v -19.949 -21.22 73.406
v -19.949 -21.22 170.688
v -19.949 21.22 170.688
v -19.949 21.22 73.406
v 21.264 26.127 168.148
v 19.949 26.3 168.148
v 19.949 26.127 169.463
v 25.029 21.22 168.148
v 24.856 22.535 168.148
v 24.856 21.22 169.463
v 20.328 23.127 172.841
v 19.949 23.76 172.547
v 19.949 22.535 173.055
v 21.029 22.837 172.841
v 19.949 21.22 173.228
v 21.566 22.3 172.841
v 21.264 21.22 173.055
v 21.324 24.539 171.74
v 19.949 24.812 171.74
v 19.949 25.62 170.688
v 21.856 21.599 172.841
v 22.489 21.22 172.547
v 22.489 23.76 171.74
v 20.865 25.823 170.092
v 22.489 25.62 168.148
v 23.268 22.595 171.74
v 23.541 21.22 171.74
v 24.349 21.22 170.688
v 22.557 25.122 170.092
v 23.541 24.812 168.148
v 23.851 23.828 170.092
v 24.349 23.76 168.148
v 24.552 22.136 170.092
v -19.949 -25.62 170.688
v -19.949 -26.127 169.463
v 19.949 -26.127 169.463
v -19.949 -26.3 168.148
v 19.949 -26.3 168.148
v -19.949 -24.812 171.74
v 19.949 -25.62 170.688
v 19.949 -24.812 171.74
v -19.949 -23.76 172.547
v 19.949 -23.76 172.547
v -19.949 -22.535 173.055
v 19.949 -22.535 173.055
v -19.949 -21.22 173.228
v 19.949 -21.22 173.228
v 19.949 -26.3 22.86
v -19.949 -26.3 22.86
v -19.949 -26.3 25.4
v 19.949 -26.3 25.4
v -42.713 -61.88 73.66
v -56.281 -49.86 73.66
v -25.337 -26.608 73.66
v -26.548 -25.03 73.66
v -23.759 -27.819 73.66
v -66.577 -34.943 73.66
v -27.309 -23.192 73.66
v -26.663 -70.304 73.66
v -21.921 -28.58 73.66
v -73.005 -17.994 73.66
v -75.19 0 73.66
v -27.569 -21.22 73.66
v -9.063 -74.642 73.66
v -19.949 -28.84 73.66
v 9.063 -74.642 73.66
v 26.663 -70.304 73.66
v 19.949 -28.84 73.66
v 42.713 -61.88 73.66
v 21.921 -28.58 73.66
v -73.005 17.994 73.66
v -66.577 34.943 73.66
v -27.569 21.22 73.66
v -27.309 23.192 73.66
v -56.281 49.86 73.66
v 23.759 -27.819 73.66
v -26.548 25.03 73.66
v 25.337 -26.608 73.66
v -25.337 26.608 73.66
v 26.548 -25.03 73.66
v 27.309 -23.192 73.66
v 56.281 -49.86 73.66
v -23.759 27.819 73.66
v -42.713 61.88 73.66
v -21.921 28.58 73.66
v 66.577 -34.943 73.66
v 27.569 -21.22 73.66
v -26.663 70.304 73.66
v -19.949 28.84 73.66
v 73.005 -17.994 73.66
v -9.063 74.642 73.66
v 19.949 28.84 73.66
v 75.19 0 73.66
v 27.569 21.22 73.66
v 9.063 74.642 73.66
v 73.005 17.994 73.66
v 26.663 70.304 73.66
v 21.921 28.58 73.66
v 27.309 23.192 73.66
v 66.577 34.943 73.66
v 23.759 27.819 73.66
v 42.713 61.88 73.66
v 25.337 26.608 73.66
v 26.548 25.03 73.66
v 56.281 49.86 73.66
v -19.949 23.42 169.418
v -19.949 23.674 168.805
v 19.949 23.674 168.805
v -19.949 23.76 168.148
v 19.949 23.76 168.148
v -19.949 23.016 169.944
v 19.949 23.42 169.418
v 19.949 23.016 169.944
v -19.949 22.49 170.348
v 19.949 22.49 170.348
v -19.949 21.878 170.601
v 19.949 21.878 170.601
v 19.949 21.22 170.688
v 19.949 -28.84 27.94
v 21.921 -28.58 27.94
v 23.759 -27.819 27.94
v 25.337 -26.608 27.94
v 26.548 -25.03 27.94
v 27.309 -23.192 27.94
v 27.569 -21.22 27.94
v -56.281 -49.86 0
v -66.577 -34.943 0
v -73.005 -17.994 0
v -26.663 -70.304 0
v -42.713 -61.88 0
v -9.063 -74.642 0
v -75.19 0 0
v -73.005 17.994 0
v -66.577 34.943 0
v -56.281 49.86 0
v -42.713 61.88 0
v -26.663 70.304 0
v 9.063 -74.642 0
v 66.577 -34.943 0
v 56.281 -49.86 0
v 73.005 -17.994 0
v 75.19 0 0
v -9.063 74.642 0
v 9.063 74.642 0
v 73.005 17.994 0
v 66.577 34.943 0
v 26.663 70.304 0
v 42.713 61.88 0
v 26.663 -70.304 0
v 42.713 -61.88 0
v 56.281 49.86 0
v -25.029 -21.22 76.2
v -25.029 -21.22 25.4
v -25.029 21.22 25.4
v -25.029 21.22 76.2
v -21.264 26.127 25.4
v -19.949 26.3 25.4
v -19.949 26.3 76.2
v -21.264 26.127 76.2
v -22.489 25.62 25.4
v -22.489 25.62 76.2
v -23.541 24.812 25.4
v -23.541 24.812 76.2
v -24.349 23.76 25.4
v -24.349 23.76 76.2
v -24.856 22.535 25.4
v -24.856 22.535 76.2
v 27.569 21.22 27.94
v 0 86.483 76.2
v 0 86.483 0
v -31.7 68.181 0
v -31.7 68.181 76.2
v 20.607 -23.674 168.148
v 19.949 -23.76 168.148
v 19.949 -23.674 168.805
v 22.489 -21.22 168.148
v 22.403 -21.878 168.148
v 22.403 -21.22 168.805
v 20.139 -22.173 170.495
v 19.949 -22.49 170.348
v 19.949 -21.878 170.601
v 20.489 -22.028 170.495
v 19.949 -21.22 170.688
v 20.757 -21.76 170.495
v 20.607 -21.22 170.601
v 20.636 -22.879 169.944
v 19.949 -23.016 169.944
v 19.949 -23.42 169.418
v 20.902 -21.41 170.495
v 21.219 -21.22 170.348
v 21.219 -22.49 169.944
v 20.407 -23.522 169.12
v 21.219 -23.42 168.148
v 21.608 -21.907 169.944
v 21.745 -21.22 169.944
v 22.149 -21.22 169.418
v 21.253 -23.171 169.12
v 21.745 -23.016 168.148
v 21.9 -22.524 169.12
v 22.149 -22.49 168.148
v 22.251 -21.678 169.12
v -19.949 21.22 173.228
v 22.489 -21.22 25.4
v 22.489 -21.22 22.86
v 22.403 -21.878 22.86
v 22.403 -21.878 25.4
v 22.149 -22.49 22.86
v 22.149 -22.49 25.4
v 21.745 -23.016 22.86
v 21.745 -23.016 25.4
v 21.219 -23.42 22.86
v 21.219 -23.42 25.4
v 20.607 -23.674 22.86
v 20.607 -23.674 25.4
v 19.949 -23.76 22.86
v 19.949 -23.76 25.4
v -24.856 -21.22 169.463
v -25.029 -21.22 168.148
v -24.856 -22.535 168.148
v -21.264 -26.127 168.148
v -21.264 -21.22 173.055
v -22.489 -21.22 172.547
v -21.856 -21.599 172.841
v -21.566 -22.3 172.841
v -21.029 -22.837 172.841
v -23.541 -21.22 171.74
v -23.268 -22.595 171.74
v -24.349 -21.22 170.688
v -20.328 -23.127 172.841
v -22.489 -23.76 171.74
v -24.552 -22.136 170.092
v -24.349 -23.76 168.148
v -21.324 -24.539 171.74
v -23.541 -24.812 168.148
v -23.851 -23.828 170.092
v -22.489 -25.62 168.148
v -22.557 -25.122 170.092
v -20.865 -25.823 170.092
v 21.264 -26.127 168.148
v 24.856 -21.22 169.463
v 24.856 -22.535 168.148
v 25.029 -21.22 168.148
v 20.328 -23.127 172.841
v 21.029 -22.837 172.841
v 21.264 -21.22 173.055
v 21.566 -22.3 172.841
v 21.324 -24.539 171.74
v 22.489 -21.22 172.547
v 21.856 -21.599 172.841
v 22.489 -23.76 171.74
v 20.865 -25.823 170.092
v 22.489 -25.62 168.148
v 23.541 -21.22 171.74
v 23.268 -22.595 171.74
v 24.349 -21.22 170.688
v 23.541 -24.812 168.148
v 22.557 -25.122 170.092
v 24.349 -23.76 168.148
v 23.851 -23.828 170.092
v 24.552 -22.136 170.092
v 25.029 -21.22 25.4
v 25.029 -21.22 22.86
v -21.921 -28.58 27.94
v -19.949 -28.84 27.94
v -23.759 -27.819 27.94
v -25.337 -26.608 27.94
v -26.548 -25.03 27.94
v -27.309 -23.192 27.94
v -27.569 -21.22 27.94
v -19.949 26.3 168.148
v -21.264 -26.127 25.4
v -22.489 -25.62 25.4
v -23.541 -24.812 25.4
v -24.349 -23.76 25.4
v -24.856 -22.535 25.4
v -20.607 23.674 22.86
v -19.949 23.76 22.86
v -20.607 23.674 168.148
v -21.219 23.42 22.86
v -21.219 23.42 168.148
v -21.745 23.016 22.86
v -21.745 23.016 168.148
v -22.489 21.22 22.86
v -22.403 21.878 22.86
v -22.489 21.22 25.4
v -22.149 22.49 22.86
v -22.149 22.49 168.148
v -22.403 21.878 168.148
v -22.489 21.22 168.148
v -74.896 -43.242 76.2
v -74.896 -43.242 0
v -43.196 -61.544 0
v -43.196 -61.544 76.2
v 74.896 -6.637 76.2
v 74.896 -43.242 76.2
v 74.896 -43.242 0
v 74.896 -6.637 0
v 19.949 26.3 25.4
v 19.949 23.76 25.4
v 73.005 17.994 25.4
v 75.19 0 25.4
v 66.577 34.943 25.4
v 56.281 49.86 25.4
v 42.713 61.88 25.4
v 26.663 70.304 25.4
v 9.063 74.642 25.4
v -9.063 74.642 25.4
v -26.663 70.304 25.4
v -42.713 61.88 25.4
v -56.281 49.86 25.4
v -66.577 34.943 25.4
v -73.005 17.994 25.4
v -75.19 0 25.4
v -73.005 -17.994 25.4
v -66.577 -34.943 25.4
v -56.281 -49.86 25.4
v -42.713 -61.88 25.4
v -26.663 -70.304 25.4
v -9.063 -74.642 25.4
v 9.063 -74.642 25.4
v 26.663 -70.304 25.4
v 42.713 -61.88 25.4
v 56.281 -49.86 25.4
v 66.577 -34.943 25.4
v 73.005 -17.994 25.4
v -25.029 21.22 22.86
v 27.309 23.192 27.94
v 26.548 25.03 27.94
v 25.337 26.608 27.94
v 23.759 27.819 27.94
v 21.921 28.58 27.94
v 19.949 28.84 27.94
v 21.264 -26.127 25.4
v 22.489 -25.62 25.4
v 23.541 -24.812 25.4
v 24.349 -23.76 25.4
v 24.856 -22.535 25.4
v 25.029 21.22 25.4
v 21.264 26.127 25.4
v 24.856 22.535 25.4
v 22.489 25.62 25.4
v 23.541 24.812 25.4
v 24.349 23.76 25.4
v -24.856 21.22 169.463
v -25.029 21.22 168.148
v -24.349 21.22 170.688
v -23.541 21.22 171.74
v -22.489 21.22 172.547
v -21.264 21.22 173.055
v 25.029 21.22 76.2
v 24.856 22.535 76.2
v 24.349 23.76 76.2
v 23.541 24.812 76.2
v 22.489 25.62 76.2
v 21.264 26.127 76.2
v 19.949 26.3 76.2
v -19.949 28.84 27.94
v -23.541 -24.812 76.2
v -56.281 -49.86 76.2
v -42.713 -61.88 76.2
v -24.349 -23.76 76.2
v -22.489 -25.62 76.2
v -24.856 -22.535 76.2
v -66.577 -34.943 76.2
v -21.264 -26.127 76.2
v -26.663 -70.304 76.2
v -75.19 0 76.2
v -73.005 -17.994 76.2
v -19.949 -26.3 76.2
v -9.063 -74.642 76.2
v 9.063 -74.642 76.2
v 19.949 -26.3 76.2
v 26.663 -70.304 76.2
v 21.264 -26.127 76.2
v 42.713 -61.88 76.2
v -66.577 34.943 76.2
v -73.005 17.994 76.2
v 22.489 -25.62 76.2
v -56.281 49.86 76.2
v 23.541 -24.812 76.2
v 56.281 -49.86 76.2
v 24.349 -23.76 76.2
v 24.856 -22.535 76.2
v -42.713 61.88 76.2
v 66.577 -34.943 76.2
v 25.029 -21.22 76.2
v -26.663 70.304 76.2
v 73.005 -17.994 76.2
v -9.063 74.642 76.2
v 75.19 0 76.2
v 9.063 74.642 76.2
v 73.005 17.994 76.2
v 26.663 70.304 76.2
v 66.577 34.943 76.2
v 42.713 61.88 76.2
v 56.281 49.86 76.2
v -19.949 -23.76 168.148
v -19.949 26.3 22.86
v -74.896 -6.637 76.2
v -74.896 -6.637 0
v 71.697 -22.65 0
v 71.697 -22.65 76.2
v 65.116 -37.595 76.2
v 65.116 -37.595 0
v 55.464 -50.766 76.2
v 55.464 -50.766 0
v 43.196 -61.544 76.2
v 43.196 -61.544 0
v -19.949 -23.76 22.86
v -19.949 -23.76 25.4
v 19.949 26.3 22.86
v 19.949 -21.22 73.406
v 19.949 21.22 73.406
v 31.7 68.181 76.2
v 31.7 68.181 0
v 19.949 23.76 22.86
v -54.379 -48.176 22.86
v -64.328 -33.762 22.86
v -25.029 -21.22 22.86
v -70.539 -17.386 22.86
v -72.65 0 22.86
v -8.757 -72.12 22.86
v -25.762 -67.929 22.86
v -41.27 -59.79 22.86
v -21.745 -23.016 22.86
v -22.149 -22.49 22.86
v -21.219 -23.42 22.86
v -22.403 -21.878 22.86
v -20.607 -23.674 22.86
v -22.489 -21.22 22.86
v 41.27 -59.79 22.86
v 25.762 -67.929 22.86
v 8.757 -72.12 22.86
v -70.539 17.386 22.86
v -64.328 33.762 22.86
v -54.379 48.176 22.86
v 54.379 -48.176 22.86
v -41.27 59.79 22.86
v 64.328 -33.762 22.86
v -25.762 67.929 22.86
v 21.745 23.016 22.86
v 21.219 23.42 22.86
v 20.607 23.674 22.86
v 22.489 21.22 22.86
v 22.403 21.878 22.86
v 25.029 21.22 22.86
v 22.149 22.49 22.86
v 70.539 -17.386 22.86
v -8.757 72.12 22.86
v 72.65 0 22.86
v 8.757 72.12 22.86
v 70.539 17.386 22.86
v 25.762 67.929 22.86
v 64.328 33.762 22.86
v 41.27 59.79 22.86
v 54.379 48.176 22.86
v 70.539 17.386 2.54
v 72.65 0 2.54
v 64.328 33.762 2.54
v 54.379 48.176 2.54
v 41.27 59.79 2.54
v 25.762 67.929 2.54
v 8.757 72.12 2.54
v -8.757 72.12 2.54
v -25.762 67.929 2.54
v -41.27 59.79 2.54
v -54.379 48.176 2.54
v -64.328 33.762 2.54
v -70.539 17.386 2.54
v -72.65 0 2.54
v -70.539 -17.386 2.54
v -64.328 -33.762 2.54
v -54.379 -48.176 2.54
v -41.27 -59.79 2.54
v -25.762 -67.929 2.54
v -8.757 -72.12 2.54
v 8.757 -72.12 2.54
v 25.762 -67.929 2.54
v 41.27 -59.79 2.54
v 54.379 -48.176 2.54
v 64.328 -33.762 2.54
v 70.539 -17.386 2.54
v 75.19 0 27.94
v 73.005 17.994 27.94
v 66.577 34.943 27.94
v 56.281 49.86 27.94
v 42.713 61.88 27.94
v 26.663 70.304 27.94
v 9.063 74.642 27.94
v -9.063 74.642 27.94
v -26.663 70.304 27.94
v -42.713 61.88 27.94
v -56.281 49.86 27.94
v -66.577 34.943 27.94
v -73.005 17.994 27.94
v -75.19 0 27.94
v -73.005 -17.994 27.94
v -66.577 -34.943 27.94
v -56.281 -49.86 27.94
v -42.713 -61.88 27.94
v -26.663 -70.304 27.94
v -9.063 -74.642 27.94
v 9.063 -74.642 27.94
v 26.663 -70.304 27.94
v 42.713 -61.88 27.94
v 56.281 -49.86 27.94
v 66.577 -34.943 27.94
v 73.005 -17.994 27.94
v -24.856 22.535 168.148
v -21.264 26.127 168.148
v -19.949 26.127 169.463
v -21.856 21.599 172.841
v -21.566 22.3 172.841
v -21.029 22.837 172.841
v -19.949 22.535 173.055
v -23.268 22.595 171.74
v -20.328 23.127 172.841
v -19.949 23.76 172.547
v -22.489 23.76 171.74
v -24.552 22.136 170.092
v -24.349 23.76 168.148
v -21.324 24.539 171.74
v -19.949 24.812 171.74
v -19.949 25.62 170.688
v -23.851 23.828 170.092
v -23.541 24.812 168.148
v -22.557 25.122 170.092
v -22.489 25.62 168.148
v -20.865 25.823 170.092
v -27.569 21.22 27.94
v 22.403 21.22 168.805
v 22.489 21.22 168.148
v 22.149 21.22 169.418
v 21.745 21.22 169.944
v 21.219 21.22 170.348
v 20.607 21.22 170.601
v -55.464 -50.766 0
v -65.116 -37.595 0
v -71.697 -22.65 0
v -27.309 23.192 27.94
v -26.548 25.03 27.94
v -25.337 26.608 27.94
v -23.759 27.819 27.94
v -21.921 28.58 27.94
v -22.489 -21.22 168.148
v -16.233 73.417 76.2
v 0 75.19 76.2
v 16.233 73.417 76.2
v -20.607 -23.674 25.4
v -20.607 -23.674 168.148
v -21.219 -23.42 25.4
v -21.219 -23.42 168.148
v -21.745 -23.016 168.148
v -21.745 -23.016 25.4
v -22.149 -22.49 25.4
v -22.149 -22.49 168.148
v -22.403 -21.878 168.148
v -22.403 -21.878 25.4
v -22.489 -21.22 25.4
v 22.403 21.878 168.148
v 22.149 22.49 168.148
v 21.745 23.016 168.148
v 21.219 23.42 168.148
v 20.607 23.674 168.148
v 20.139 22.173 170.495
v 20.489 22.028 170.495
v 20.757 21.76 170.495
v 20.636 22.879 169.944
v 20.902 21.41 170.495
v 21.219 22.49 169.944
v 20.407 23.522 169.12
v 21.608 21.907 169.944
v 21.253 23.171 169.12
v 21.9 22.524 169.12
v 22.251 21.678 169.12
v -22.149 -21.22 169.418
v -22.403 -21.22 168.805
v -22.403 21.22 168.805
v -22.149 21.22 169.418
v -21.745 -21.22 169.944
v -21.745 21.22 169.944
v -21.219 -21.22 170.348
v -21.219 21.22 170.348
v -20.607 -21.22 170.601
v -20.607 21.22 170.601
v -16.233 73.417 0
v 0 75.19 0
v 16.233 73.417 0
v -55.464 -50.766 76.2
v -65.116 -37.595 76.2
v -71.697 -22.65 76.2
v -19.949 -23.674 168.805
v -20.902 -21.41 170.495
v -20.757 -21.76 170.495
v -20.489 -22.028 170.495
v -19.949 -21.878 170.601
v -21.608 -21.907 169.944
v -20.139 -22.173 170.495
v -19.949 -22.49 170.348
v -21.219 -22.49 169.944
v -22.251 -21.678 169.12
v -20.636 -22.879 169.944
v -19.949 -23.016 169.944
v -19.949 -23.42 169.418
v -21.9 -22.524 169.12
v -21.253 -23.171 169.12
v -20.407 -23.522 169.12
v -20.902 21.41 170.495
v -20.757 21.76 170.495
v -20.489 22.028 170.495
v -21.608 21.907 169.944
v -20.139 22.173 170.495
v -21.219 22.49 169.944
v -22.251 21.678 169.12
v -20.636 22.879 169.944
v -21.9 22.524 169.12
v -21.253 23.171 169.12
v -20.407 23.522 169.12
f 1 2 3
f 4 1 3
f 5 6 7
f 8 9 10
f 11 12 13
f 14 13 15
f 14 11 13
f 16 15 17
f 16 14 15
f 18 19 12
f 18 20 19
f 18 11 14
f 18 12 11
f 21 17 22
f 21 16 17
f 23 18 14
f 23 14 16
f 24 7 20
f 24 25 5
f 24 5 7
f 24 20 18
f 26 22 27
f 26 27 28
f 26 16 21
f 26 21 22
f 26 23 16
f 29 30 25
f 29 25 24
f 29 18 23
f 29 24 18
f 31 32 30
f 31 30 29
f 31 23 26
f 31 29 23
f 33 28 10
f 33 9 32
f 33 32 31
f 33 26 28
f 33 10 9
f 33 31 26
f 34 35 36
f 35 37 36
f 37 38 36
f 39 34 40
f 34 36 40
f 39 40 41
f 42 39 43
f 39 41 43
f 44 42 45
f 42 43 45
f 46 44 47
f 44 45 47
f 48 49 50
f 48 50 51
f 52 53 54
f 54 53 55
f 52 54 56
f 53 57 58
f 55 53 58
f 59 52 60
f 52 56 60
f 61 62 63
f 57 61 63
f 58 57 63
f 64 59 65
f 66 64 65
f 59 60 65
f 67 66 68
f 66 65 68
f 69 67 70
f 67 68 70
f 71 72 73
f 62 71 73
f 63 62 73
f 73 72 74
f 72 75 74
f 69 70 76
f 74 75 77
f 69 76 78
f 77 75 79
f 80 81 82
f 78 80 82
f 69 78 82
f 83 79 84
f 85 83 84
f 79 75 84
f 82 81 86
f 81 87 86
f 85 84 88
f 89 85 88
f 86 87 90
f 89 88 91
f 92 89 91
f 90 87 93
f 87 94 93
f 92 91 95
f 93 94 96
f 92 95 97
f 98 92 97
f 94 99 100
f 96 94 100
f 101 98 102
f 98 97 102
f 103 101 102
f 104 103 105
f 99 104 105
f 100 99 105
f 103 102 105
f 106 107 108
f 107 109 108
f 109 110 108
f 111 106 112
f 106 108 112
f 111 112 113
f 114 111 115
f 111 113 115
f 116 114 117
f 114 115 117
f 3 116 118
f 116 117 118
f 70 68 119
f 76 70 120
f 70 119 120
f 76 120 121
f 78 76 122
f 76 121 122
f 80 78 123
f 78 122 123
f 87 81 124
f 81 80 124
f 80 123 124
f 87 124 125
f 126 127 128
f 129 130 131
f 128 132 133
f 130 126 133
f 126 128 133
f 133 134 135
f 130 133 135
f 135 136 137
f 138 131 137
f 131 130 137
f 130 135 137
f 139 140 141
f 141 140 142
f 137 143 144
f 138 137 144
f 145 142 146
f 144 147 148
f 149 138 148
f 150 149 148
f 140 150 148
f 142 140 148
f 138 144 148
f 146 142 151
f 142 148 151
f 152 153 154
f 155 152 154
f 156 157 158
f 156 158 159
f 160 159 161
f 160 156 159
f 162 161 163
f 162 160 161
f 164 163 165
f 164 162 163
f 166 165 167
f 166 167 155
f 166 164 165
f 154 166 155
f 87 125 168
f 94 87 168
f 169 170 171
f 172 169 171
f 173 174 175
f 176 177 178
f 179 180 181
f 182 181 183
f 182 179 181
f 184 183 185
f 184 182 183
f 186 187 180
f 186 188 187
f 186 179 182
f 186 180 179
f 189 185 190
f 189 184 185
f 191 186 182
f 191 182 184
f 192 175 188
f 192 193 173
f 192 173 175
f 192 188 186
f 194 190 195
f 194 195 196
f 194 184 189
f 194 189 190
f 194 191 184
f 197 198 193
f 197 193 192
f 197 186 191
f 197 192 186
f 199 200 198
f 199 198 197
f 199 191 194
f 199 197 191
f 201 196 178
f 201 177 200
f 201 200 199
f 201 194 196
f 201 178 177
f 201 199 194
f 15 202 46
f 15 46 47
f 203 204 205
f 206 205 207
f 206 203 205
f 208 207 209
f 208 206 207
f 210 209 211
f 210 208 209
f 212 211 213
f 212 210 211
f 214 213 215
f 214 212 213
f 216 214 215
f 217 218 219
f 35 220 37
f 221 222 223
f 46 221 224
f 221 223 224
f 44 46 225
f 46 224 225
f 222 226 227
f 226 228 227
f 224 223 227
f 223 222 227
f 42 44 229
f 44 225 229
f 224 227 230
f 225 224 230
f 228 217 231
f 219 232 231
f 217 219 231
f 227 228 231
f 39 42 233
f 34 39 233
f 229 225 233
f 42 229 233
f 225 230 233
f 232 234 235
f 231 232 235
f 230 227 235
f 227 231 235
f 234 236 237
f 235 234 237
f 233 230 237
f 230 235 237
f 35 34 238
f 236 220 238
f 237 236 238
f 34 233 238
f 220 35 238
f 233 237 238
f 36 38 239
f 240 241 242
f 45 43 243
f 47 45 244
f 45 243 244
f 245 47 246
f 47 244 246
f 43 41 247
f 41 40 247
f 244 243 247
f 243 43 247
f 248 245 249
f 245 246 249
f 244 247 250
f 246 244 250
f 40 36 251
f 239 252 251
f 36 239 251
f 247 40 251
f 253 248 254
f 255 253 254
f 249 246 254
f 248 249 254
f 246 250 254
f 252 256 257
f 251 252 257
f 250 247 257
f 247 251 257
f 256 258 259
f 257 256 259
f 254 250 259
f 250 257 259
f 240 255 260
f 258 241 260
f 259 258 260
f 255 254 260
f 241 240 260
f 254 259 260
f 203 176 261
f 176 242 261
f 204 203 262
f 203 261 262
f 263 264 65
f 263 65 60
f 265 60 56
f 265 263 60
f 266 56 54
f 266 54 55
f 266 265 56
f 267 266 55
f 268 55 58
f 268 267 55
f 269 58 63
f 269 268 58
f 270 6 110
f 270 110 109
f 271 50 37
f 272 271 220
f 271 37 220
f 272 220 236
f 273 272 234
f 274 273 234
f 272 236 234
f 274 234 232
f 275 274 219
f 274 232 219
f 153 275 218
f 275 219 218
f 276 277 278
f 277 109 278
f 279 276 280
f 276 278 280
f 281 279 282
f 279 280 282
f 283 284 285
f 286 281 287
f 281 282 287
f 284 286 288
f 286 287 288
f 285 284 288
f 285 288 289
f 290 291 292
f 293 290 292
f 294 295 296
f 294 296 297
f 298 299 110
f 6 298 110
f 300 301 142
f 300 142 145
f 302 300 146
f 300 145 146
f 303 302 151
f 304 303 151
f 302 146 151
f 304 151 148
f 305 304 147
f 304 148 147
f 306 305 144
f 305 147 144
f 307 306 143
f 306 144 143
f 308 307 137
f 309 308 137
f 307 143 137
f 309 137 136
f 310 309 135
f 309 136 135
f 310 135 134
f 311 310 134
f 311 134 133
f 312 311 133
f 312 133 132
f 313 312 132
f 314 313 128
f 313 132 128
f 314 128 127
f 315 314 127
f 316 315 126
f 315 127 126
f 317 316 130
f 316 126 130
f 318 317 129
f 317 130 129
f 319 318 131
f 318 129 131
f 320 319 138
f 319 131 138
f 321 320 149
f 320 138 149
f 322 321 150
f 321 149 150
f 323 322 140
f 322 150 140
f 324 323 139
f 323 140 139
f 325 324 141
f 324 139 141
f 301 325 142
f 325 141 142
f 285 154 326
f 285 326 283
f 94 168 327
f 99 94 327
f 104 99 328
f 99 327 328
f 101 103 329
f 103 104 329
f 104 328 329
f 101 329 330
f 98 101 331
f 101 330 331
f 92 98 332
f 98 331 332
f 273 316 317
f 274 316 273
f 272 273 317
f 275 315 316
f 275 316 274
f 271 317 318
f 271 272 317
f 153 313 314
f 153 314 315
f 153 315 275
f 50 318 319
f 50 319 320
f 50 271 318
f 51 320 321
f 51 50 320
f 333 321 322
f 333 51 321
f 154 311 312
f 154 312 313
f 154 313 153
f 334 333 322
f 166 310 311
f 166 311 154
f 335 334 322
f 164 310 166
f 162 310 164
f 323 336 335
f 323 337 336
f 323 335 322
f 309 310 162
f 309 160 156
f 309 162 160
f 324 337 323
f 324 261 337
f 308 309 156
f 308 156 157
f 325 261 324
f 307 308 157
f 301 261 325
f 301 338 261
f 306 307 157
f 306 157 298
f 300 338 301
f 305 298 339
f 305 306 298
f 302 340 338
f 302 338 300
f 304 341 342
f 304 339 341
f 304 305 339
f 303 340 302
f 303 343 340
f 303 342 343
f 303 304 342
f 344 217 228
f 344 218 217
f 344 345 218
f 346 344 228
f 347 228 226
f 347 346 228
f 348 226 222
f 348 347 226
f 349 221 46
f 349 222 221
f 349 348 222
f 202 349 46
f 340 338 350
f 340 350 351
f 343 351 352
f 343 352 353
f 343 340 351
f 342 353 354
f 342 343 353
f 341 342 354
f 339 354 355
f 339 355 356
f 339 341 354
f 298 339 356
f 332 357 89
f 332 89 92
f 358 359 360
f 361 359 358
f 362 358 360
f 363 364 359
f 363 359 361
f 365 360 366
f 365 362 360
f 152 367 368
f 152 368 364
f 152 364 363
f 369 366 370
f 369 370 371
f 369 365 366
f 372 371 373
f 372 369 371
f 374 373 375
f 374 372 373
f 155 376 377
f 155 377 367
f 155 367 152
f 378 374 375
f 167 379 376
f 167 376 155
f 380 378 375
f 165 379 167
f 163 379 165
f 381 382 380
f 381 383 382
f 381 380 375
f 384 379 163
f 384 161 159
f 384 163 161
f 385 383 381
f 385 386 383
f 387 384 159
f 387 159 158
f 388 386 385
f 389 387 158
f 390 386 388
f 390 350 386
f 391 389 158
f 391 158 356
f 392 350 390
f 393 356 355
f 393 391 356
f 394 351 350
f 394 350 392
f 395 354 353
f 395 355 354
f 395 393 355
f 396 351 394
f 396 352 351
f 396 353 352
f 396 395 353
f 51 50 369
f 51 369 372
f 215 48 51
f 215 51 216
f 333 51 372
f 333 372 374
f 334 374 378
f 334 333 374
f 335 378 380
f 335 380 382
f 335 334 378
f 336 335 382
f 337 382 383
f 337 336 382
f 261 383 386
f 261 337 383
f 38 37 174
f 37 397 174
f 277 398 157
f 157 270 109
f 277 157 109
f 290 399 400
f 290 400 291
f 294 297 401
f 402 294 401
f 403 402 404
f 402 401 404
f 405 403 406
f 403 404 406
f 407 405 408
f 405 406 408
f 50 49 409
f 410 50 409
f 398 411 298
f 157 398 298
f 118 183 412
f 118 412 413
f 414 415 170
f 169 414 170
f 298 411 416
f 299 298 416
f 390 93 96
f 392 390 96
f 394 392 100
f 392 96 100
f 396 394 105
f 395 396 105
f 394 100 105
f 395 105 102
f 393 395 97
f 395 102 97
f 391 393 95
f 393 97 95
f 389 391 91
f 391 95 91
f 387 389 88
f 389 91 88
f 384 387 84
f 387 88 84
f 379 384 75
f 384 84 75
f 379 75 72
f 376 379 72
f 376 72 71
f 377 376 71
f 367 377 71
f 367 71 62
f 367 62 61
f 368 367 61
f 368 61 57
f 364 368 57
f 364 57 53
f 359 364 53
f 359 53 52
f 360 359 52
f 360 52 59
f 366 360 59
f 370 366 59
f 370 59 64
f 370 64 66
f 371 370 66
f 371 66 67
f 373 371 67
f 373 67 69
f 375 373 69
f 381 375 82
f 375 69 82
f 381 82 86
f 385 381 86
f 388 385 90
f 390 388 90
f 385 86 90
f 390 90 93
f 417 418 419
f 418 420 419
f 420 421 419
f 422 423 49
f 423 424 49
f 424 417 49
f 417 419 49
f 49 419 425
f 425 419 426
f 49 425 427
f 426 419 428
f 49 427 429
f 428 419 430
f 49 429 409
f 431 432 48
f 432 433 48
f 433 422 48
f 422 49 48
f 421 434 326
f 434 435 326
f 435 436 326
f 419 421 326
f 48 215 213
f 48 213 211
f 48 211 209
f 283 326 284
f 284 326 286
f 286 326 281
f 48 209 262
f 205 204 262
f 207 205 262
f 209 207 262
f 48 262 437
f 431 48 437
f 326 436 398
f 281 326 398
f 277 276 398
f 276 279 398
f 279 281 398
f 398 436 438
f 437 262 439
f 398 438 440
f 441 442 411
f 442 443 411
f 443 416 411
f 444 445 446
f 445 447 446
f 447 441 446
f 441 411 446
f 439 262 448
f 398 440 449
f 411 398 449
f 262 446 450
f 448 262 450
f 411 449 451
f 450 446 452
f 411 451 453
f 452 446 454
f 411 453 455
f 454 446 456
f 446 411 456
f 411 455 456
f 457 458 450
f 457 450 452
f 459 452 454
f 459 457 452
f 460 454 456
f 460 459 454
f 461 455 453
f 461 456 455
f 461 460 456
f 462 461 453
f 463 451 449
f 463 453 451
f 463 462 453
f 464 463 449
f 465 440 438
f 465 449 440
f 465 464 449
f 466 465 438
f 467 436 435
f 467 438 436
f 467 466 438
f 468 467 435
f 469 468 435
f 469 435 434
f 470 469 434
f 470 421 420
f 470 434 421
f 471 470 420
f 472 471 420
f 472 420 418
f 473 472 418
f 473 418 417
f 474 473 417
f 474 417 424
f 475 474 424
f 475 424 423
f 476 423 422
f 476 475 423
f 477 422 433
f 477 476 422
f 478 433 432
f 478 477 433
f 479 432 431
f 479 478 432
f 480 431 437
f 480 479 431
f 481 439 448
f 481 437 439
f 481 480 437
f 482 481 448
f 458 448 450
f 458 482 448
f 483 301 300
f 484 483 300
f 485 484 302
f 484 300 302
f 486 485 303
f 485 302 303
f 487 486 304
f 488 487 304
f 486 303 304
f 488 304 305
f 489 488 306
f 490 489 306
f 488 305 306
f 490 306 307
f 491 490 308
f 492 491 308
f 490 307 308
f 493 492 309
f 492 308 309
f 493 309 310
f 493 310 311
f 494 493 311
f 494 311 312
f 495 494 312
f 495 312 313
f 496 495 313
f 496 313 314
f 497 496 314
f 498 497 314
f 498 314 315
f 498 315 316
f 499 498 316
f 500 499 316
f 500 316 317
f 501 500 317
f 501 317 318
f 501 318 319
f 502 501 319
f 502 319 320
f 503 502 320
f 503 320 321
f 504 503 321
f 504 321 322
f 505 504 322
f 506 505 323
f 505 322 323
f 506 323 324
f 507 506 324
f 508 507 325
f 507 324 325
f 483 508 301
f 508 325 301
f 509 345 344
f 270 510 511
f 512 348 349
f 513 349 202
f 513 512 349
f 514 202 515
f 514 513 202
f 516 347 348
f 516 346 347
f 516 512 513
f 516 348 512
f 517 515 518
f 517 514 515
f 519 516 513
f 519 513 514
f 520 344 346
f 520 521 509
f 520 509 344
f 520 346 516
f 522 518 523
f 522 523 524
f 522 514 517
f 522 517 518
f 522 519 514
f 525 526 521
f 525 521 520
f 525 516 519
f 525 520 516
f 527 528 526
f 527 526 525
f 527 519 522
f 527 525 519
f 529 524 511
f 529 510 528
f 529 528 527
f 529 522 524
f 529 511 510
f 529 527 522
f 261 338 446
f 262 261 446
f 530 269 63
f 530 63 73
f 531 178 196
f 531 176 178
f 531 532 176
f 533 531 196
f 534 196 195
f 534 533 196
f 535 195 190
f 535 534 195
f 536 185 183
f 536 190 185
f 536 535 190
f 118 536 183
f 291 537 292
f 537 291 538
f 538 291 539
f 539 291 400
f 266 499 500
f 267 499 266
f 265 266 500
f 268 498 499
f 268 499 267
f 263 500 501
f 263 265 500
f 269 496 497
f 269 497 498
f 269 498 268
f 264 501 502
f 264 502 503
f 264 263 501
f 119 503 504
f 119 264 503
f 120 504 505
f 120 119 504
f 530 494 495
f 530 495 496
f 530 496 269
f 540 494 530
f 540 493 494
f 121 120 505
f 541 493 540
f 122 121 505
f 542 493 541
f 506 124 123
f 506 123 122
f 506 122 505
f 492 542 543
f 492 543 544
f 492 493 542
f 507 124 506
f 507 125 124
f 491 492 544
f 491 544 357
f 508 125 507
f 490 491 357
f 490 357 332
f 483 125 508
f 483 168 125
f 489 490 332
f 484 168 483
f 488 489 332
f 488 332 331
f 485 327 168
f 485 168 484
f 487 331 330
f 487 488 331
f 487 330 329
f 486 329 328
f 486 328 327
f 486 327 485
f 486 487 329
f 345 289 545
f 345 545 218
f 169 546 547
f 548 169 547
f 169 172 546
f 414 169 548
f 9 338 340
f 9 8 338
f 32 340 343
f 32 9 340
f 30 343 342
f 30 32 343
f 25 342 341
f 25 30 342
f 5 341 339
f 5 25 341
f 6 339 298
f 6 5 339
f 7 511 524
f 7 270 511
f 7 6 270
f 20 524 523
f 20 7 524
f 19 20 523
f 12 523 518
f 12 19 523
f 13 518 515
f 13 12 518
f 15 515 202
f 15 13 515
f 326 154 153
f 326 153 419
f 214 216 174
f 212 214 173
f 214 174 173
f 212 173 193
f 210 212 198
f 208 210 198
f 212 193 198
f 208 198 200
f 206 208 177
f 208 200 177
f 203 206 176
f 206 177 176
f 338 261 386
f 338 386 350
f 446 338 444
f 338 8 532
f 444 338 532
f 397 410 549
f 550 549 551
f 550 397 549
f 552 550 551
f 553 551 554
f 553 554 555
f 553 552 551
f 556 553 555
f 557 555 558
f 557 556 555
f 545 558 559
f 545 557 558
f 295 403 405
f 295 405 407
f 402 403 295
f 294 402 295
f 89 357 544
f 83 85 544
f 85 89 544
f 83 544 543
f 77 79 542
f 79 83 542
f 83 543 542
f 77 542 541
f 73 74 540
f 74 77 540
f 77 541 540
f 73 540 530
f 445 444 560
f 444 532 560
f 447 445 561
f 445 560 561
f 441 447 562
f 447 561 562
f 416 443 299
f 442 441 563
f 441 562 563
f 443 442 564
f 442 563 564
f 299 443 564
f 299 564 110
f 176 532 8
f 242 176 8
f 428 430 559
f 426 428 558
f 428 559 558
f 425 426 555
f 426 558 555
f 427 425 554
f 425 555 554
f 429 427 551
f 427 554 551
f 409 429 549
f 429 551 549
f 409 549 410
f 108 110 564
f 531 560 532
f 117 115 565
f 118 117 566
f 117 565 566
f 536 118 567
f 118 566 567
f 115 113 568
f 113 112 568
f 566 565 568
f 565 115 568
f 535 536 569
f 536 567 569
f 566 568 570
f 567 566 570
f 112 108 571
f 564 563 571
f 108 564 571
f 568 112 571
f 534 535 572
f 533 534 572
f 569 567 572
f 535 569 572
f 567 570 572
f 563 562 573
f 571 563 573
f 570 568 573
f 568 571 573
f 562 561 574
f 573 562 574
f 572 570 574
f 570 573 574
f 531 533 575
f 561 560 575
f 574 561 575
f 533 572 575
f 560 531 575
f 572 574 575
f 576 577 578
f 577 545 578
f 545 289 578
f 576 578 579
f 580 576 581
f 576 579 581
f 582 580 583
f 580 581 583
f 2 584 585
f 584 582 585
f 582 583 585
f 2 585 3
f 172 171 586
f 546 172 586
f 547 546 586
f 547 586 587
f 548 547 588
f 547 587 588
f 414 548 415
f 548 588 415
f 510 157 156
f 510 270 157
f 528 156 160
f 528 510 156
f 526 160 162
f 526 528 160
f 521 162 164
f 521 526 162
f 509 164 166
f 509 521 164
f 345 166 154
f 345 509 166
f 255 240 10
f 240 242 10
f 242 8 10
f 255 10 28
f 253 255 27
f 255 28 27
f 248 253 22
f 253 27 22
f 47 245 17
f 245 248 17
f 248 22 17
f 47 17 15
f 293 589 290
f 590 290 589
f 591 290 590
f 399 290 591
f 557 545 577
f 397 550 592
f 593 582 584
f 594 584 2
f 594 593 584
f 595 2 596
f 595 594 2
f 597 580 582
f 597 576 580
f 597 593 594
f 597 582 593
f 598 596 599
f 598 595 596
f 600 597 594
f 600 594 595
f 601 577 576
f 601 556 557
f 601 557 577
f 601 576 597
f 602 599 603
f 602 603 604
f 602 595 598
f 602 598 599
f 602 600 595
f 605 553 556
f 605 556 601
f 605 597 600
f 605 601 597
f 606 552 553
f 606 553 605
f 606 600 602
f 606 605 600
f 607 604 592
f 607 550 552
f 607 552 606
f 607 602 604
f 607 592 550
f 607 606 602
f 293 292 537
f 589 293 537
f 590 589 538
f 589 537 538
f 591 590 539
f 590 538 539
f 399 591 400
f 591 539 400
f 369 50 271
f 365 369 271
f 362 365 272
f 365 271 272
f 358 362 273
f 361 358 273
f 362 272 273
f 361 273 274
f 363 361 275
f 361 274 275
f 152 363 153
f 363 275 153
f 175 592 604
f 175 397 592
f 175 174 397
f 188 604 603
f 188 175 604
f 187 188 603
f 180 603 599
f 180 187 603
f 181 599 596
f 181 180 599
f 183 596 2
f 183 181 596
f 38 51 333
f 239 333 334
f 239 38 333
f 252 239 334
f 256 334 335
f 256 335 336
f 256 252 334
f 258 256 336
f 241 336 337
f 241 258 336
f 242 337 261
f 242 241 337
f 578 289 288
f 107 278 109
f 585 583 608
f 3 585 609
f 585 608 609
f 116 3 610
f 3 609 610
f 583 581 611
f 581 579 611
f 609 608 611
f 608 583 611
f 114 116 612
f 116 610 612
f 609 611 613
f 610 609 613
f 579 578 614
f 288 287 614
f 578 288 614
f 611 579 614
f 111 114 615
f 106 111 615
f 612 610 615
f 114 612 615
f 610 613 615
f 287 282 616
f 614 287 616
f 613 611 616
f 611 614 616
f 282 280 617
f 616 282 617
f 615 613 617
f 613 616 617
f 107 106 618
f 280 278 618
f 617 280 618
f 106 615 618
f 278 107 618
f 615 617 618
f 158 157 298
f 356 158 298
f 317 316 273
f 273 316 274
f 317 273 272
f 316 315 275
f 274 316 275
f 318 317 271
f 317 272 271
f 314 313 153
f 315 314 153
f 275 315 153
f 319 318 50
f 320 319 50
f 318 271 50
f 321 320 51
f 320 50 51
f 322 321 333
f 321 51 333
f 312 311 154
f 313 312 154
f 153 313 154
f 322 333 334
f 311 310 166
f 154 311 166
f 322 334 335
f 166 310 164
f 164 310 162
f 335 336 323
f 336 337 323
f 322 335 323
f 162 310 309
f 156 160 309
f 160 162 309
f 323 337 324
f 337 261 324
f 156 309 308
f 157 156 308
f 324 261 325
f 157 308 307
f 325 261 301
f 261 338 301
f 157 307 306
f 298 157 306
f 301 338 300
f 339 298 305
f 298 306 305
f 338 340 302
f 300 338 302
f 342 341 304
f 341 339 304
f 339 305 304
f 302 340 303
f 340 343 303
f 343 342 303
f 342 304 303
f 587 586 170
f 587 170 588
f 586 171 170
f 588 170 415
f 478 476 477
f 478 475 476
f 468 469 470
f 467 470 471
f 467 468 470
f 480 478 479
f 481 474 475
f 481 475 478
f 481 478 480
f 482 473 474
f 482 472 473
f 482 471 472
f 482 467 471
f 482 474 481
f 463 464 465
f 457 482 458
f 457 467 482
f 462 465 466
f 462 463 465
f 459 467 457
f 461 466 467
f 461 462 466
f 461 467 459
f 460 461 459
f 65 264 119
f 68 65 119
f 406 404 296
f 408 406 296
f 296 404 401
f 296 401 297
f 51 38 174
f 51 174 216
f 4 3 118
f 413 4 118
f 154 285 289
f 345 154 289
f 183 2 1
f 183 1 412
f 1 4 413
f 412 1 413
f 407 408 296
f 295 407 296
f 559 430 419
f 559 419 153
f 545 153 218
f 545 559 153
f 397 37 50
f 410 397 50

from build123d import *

# Parameters (mm, degrees)
F2_DEPTH     = 76.2
F0_R         = 75.1900139913
F3_DEPTH     = 25.4
F4_W         = 50.0582046807
F4_H         = 52.6002421975
F5_DEPTH     = 147.828
F6_R         = 5.08
F7_DEPTH     = 50.8
F8_T         = -2.54
F9_T         = 2.54
F9_T4_ANGLE  = 90.000000001
F9_T6_ANGLE  = 90.000000001
F9_T8_ANGLE  = 90.000000001
F9_T10_ANGLE = 90.000000001
F10_DEPTH    = 99.822


# Not quite as in the source:
# - a shell that OpenCascade refuses in one call is made with other operations: the cavity is built on its own and cut out


with BuildPart() as f2:
    # F1 (on face) → F2 (new body)
    with BuildSketch(Plane.XY):
        with BuildLine():
            Line((-74.8964771628, -6.6374628139), (-74.8964771628, -43.2415012513))
            Line((-74.8964771628, -43.2415012513), (-43.1964499949, -61.5435204701))
            ThreePointArc((-43.1964499949, -61.5435204701), (-65.1164622274, -37.5950069956), (-74.8964771628, -6.6374628139))
        make_face()
    extrude(amount=F2_DEPTH)


with BuildPart() as f2b:
    # F1 (on face) → F2, piece 2 (new body)
    with BuildSketch(Plane.XY):
        with BuildLine():
            Line((0, 86.4830025026), (-31.7000271679, 68.1809832839))
            ThreePointArc((-31.7000271679, 68.1809832839), (0, 75.1900139913), (31.7000271679, 68.1809832839))
            Line((31.7000271679, 68.1809832839), (0, 86.4830025026))
        make_face()
    extrude(amount=F2_DEPTH)


with BuildPart() as f2c:
    # F1 (on face) → F2, piece 3 (new body)
    with BuildSketch(Plane.XY):
        with BuildLine():
            ThreePointArc((74.8964771628, -6.6374628139), (65.1164622274, -37.5950069956), (43.1964499949, -61.5435204701))
            Line((43.1964499949, -61.5435204701), (74.8964771628, -43.2415012513))
            Line((74.8964771628, -43.2415012513), (74.8964771628, -6.6374628139))
        make_face()
    extrude(amount=F2_DEPTH)


with BuildPart() as f3:
    # F0 (on Top) → F3 (new body)
    with BuildSketch(Plane.XY):
        Circle(F0_R)
    extrude(amount=F3_DEPTH)

    # F4 (on face) → F5 (join)
    with BuildSketch(Plane.XY.offset(25.4)):
        Rectangle(F4_W, F4_H)
    extrude(amount=F5_DEPTH)

    # F6
    f6_edges = [f3.edges().sort_by_distance(p)[0] for p in [
        (25.029102, -26.300121, 99.314),
        (25.029102, 26.300121, 99.314),
        (-25.029102, 26.300121, 99.314),
        (-25.029102, -26.300121, 99.314),
        (-25.029102, 0, 173.228),
        (0, -26.300121, 173.228),
        (0, 26.300121, 173.228),
        (25.029102, 0, 173.228),
    ]]
    fillet(f6_edges, radius=F6_R)


with BuildPart() as f7:
    # F7 (new): a face of the model
    f7_faces = [f3.part.faces().sort_by_distance(p)[0] for p in [
        (27.1557970912, 0, 25.4),
    ]]
    extrude(f7_faces, amount=F7_DEPTH)

    # F8
    f8_openings = [f7.faces().sort_by_distance(p)[0] for p in [
        (-75.190014, 0, 50.8),
    ]]
    offset(amount=F8_T, openings=f8_openings)


with BuildPart() as f3_1:
    add(f3.part)

    # F9: shell of thickness 2.54, made by hand


with BuildPart() as f9_core1:
    # F9_t2: copy of F3
    add(f3_1.part)

    # the walls: a layer under each face that stays
    f9_faces = [f9_core1.faces().sort_by_distance(p)[0] for p in [
        (-50.1266759942, -50.1266759942, 25.4),
        (23.5412047888, -24.8122235472, 96.774),
        (23.5412047888, 24.8122235472, 96.774),
        (-23.5412047888, -24.8122235472, 96.774),
        (-23.5412047888, 24.8122235472, 96.774),
        (-75.1900139913, 0, 12.7),
        (23.5412047888, 0, 171.7401024484),
        (22.4891023403, -23.7601210988, 171.7401024484),
        (22.4891023403, 23.7601210988, 171.7401024484),
        (0, -24.8122235472, 171.7401024484),
        (0, 24.8122235472, 171.7401024484),
        (-22.4891023403, -23.7601210988, 171.7401024484),
        (-22.4891023403, 23.7601210988, 171.7401024484),
        (-23.5412047888, 0, 171.7401024484),
        (0, 0, 0),
        (0, 0, 173.228),
    ]]
    thicken(f9_faces, amount=-F9_T, mode=Mode.SUBTRACT)

    # F9_s3 → F9_t4 (revolve, cut)
    with BuildSketch(Plane.XZ.offset(21.2201210988)):
        Polygon((25.0545023403, 25.4254), (25.0291023403, 22.86), (22.4891023403, 22.86), (22.4891023403, 25.4), align=None)
    revolve(axis=Axis((19.9491023403, -21.2201210988, 25.4), (0, 0, -1)), revolution_arc=F9_T4_ANGLE, mode=Mode.SUBTRACT)

    # F9_s5 → F9_t6 (revolve, cut)
    with BuildSketch(Plane.XZ.offset(-21.2201210988)):
        Polygon((25.0545023403, 25.4254), (25.0291023403, 22.86), (22.4891023403, 22.86), (22.4891023403, 25.4), align=None)
    revolve(axis=Axis((19.9491023403, 21.2201210988, 25.4), (0, 0, 1)), revolution_arc=F9_T6_ANGLE, mode=Mode.SUBTRACT)

    # F9_s7 → F9_t8 (revolve, cut)
    with BuildSketch(Plane.XZ.offset(21.2201210988)):
        Polygon((-25.0545023403, 25.4254), (-25.0291023403, 22.86), (-22.4891023403, 22.86), (-22.4891023403, 25.4), align=None)
    revolve(axis=Axis((-19.9491023403, -21.2201210988, 25.4), (0, 0, 1)), revolution_arc=F9_T8_ANGLE, mode=Mode.SUBTRACT)

    # F9_s9 → F9_t10 (revolve, cut)
    with BuildSketch(Plane.YZ.offset(-19.9491023403)):
        Polygon((26.3255210988, 25.4254), (26.3001210988, 22.86), (23.7601210988, 22.86), (23.7601210988, 25.4), align=None)
    revolve(axis=Axis((-19.9491023403, 21.2201210988, 25.4), (0, 0, 1)), revolution_arc=F9_T10_ANGLE, mode=Mode.SUBTRACT)


with BuildPart() as f3_2:
    add(f3_1.part)

    # what is left inside the walls is the cavity
    f9_cavity = [f9_core1.part.solids().sort_by_distance(p)[0] for p in [
        (0, -24.216671, 2.5654),
    ]]
    add(f9_cavity, mode=Mode.SUBTRACT)

    # F10 (add): a face of the model
    f10_faces = [f3_2.faces().sort_by_distance(p)[0] for p in [
        (0, 0, 173.228),
    ]]
    extrude(f10_faces, amount=-F10_DEPTH)


solid = Compound([f2.part, f2b.part, f2c.part, f7.part, f3_2.part])
